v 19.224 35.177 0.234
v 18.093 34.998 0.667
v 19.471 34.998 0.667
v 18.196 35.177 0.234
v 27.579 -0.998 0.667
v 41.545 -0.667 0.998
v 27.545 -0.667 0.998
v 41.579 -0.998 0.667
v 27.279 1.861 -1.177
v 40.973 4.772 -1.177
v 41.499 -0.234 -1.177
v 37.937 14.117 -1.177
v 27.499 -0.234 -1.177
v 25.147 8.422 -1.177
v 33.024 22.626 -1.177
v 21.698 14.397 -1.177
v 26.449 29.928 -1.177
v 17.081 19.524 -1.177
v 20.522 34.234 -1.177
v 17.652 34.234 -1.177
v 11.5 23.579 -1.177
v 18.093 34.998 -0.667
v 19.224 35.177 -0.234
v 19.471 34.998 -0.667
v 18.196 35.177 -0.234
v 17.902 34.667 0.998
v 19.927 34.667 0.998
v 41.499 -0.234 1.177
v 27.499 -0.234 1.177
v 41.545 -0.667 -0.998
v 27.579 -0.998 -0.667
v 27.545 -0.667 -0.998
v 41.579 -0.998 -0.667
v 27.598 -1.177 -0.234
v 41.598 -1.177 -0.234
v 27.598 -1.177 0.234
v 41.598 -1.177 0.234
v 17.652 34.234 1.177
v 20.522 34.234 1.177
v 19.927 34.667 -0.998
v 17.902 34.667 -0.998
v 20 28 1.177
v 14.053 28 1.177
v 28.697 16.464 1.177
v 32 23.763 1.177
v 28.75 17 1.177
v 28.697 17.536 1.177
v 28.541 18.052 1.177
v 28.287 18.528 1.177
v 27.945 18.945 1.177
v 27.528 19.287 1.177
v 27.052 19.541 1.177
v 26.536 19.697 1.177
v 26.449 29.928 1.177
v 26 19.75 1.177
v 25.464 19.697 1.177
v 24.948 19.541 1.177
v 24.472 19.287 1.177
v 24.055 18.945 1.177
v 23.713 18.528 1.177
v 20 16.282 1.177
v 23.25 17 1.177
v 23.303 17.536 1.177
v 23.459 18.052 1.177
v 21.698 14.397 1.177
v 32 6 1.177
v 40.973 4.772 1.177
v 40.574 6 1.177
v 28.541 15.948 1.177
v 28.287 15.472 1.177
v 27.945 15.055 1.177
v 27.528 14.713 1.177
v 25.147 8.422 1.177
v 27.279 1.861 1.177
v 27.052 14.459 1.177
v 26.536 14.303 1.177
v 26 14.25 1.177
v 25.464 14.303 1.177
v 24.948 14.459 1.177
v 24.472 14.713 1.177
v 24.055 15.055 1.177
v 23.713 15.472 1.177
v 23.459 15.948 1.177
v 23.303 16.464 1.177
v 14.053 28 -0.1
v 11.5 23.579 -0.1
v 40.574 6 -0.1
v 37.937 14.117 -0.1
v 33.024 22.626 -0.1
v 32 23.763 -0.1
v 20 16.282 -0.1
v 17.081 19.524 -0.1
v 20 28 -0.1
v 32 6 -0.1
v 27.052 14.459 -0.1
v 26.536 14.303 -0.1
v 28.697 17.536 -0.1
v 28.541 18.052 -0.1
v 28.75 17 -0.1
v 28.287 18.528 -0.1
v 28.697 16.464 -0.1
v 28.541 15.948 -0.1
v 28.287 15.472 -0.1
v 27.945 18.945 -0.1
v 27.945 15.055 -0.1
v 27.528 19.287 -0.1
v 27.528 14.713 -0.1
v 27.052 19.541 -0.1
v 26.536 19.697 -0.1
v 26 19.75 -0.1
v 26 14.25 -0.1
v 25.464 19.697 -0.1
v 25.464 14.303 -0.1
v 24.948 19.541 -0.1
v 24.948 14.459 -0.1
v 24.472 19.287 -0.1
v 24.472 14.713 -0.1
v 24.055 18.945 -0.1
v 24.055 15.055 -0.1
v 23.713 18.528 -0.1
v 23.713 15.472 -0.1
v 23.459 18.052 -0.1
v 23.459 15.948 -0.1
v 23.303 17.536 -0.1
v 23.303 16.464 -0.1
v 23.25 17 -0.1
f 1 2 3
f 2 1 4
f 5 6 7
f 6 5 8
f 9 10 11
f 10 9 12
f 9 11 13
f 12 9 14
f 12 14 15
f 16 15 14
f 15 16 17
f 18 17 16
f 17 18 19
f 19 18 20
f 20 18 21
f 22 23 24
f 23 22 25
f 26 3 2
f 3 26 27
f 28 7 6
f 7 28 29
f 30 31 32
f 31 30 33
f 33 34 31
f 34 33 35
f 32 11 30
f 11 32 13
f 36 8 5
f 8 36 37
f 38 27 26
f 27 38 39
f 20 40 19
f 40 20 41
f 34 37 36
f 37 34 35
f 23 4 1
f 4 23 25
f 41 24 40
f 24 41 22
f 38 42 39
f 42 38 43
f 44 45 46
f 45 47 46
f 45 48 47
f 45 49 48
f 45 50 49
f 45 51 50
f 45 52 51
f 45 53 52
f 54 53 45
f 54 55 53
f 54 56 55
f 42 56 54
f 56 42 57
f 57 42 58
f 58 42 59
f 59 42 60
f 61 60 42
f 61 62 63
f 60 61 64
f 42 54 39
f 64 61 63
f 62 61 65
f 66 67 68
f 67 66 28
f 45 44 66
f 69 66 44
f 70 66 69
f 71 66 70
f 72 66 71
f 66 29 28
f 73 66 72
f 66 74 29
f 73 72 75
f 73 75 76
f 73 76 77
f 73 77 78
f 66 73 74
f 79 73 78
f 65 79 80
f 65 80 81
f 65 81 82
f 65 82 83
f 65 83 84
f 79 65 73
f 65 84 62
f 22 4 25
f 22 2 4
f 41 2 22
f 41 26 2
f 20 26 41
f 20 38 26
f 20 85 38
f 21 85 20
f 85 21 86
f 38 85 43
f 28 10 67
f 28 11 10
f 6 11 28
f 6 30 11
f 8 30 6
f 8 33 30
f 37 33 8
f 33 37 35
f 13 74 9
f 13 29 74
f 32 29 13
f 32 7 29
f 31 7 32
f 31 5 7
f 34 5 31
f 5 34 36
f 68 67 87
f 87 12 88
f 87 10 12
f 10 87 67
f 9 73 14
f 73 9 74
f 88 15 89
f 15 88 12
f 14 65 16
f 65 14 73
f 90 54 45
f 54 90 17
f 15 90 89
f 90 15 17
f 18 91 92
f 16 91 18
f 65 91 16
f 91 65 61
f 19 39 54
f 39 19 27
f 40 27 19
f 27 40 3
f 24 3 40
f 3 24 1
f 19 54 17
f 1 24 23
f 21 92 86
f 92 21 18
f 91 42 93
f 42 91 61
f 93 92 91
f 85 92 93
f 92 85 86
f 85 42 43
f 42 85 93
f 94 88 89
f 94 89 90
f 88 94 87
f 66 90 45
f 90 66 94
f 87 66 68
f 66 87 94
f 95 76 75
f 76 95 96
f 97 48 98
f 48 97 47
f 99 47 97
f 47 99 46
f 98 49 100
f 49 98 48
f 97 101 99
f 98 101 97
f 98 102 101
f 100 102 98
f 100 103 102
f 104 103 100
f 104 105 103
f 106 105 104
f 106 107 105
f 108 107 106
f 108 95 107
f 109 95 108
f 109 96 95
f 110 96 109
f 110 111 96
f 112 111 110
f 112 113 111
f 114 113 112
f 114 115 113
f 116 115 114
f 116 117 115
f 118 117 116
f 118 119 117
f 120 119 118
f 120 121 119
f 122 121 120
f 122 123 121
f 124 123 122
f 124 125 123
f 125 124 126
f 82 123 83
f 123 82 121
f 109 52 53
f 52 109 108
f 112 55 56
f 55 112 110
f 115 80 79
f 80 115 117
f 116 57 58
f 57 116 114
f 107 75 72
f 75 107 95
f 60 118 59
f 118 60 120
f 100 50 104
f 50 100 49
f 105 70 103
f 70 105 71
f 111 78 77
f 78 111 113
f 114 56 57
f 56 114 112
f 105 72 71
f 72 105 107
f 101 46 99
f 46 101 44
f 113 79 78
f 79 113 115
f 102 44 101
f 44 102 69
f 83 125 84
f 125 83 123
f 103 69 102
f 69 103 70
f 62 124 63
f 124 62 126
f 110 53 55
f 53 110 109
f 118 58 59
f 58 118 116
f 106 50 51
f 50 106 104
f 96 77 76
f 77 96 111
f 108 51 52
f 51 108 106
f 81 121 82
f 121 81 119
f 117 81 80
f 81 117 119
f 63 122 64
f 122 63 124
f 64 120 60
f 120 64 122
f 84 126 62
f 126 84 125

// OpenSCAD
// Copyright (c) 2026 paidaxin-12138
// Licensed under CC BY-NC 4.0 — see LICENSE in repository root.
// https://creativecommons.org/licenses/by-nc/4.0/

// ZenPulse 腕带托板 — OpenSCAD 参数化原型
// 导出 STL: OpenSCAD → F6 → Export STL

length = 52;
width = 34;
thickness = 9;
arc_radius = 40;

sensor_pitch = 12;
sensor1_x = 14;
sensor2_x = sensor1_x + sensor_pitch;
sensor_y = width / 2;
led_hole_r = 2.75;
skirt_h = 1.5;
skirt_w = 2;
strap_slot_w = 22;
strap_slot_len = 14;

module rounded_bar() {
  hull() {
    for (dx = [0, length]) {
      for (dy = [0, width]) {
        translate([dx, dy, 0]) sphere(r = 1.2, $fn = 16);
      }
    }
  }
}

module strap_slots() {
  for (sx = [6, length - 6 - strap_slot_len]) {
    translate([sx, (width - strap_slot_w) / 2, -0.1])
      cube([strap_slot_len, strap_slot_w, thickness + 0.2]);
  }
}

module sensor_window(cx) {
  translate([cx, sensor_y, -0.1])
    cylinder(h = thickness + 0.2, r = led_hole_r, $fn = 32);
  for (a = [0:90:270]) {
    rotate([0, 0, a])
      translate([cx + led_hole_r + skirt_w / 2, sensor_y, thickness - skirt_h])
        cube([skirt_w, skirt_w, skirt_h + 0.1], center = true);
  }
}

difference() {
  intersection() {
    rounded_bar();
    translate([-5, -5, -arc_radius + 2])
      scale([1, 1, 1])
        translate([0, 0, arc_radius])
          rotate_extrude(angle = 60, convexity = 4)
            translate([arc_radius, 0, 0])
              square([thickness + 5, width + 10], center = true);
  }
  strap_slots();
  sensor_window(sensor1_x);
  sensor_window(sensor2_x);
}
